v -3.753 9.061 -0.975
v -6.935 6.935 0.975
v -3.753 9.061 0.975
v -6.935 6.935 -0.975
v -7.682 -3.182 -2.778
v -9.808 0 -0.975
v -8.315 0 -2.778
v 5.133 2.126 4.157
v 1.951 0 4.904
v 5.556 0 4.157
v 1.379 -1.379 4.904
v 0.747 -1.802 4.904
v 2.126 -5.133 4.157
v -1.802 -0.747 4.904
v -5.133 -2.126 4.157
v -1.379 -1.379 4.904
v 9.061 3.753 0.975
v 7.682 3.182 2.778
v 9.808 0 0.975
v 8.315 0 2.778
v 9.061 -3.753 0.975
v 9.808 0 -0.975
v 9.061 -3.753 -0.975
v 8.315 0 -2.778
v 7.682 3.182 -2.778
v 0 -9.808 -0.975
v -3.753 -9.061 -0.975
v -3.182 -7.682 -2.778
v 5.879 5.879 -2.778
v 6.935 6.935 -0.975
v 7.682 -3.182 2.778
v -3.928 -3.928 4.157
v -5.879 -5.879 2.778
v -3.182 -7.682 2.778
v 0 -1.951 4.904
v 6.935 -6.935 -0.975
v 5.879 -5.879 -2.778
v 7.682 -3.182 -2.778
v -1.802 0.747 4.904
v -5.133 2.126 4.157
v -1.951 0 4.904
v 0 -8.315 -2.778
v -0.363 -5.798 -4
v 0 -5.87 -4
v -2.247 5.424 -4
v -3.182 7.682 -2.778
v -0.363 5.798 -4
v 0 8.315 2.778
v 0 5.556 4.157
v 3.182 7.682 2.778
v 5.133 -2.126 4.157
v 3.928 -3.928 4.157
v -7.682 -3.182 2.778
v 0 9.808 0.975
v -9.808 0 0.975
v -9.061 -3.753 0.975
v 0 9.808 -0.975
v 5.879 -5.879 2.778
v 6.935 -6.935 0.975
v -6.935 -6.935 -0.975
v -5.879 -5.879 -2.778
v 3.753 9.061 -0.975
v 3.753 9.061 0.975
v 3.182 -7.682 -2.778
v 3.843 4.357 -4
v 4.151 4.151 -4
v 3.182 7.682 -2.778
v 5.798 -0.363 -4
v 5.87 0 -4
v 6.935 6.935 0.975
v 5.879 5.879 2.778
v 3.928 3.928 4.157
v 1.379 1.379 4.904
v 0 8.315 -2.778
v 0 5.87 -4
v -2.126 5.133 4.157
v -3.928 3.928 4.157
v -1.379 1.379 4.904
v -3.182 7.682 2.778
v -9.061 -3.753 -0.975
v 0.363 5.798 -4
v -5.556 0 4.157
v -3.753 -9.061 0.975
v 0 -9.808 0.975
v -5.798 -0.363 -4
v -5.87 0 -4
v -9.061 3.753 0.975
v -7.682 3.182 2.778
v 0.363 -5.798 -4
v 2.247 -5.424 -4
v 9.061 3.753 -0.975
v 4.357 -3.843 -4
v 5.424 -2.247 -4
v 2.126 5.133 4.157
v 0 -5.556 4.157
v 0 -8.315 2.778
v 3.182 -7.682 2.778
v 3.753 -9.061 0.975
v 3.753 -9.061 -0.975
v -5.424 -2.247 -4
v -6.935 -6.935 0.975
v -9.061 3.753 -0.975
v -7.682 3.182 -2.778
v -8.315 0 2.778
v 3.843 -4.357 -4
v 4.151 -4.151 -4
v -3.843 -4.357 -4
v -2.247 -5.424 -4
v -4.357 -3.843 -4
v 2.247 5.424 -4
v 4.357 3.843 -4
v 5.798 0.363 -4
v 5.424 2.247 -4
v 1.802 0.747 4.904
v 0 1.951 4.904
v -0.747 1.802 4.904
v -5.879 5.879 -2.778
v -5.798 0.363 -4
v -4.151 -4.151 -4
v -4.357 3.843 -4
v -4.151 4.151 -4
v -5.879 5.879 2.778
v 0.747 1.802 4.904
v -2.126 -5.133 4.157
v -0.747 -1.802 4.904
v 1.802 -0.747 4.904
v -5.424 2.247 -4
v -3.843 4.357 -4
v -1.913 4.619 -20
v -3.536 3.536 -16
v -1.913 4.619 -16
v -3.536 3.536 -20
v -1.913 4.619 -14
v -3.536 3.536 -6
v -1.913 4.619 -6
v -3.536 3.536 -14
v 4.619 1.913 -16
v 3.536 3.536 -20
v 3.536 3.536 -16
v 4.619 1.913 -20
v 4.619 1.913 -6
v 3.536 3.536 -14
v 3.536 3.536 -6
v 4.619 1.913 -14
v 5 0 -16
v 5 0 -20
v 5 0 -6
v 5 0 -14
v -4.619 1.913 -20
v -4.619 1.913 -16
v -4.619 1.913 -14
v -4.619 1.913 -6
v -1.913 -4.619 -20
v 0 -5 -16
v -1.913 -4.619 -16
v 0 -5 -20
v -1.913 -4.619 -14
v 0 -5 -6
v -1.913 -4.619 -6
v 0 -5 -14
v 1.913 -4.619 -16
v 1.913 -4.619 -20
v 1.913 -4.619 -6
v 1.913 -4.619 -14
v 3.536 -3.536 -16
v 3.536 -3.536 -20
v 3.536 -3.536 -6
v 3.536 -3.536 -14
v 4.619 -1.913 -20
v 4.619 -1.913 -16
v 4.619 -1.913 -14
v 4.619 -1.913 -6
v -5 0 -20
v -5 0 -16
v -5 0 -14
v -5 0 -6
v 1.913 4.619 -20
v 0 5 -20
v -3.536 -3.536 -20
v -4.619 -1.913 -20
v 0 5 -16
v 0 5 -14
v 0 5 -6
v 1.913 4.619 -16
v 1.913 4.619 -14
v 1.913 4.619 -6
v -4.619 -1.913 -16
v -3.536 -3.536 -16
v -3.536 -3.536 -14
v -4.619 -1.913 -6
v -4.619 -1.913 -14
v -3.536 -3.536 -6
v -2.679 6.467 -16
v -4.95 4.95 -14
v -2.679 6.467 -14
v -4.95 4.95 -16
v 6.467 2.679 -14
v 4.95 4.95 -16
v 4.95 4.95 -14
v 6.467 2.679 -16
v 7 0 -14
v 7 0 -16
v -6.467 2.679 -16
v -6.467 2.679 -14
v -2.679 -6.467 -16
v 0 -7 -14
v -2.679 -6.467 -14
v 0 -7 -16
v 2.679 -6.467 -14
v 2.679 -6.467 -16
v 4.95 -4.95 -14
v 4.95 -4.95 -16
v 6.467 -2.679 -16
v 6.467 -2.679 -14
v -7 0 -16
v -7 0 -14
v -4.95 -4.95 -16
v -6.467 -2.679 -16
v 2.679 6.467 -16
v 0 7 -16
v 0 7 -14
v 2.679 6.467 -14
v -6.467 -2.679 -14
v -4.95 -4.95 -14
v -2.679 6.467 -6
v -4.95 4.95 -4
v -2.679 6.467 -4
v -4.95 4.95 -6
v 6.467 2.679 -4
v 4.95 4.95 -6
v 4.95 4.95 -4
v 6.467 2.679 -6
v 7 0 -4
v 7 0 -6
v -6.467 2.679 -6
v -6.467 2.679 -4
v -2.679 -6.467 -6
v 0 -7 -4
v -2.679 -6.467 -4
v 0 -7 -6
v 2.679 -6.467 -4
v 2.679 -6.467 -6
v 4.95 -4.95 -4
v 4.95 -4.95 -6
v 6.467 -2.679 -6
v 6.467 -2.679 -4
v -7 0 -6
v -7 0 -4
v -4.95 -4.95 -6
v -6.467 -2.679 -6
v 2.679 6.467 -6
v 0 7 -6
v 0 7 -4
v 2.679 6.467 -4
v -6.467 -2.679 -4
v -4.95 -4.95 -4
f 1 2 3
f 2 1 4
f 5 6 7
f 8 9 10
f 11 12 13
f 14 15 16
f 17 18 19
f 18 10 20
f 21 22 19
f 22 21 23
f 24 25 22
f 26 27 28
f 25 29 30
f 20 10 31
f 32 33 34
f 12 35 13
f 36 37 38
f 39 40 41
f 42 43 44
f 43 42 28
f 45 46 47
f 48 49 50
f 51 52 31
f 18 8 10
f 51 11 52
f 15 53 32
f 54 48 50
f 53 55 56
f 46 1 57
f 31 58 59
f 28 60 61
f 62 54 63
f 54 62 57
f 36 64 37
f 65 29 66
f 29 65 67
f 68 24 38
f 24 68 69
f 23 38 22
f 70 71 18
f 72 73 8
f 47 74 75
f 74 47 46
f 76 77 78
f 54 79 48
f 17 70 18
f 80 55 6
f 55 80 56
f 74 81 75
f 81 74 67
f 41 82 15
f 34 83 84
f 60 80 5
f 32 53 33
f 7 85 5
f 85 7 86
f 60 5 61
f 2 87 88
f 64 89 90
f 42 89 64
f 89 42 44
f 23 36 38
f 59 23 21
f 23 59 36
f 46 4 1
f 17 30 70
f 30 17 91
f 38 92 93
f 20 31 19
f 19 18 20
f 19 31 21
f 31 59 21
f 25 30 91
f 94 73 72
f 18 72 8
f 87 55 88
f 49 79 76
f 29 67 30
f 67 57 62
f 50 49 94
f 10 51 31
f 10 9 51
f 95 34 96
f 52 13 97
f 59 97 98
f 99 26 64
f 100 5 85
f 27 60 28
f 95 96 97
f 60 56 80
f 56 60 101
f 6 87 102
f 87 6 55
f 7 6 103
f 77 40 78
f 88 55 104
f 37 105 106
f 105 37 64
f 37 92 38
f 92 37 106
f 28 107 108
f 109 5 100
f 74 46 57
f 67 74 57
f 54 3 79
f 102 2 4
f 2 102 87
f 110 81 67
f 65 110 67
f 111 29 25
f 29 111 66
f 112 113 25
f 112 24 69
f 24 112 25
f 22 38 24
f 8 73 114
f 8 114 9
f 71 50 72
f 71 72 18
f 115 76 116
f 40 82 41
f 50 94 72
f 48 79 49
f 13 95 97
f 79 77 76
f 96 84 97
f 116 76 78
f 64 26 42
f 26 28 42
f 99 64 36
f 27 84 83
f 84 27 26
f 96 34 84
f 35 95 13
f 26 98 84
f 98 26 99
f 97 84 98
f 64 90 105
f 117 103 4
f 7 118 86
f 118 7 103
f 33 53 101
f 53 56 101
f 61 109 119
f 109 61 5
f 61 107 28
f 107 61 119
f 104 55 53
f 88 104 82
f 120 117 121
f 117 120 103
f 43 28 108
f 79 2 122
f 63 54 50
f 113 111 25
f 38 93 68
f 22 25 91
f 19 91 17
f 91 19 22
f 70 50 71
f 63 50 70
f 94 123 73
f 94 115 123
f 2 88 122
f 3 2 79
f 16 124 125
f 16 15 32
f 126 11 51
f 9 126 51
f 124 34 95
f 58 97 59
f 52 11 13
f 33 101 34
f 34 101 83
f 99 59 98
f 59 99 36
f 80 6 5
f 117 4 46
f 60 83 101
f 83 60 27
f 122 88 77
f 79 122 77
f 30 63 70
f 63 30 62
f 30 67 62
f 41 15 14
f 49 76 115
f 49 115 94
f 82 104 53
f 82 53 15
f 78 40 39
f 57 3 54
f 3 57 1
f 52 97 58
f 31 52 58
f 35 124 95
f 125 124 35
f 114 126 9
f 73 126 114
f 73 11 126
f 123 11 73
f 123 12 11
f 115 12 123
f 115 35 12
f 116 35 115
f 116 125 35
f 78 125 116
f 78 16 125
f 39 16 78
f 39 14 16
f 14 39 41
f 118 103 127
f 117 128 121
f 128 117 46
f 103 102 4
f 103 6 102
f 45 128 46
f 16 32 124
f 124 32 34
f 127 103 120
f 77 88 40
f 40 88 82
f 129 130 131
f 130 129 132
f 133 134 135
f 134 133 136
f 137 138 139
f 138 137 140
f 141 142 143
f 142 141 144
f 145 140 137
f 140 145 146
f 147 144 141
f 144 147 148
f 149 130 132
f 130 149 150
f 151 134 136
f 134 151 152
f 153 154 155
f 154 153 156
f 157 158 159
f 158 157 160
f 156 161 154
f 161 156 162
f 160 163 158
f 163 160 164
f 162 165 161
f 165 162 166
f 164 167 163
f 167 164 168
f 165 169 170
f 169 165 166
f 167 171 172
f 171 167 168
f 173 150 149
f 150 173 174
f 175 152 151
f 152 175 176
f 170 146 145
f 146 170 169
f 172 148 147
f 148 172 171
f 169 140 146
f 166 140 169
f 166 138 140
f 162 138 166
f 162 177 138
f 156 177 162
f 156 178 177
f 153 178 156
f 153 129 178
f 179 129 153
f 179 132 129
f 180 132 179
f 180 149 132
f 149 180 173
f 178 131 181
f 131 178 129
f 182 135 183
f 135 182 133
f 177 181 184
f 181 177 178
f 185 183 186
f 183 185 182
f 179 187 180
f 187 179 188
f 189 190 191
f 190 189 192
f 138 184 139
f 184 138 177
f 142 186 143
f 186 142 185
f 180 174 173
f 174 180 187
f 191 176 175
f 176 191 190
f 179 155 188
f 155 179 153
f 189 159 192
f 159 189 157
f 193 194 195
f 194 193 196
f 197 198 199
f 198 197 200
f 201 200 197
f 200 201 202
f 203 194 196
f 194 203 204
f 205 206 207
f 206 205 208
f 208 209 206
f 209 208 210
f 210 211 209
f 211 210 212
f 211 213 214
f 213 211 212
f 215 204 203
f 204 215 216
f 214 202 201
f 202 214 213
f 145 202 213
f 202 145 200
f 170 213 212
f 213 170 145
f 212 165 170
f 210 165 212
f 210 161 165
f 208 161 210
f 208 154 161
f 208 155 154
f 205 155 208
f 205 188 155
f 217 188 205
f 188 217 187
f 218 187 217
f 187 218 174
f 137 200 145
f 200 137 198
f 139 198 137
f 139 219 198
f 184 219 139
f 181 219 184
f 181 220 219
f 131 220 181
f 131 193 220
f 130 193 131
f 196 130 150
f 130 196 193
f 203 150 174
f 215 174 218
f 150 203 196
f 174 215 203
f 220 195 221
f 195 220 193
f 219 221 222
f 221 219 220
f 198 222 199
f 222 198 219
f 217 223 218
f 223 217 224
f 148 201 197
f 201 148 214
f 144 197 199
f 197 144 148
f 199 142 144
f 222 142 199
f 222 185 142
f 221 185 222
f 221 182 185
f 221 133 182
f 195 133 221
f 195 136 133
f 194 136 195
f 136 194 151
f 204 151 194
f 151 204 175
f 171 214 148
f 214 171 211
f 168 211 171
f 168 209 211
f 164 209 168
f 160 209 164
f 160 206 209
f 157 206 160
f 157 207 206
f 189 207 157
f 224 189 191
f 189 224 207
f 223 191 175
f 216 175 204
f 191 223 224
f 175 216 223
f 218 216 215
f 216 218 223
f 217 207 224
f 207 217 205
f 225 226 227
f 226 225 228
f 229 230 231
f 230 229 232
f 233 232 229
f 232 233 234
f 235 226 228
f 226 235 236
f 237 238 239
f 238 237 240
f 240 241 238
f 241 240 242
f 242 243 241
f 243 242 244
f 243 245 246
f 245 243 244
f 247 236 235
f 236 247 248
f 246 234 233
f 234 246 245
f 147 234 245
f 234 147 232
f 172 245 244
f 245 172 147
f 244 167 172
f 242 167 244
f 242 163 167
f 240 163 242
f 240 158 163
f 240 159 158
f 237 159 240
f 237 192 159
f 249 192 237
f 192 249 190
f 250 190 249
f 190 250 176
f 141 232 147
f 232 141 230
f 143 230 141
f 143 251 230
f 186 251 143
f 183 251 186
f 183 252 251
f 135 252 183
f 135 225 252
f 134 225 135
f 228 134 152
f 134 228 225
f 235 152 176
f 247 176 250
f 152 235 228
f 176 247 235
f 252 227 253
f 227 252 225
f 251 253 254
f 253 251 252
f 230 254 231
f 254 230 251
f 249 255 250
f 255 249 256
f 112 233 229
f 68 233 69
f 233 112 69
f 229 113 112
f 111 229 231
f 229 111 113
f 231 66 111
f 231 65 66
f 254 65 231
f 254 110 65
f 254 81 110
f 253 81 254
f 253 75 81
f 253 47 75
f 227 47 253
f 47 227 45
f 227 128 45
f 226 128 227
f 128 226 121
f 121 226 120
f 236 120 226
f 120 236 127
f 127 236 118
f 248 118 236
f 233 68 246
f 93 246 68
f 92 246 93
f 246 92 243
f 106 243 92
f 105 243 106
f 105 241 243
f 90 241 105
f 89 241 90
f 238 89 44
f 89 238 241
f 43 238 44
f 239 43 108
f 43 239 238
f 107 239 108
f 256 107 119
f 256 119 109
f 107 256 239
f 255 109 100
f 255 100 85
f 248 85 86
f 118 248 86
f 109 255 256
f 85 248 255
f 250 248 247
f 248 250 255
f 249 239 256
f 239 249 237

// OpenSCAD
module mushroom_fastener() {
    $fn = 16; // Low-poly tessellation
    union() {
        // Domed/conical head
        translate([0, 0, 10])
        scale([1, 1, 0.5])
        sphere(r=10);

        // Central cylindrical shank
        cylinder(h=20, r=5, center=true);

        // First retaining flange/rib
        translate([0, 0, -5])
        cylinder(h=2, r=7, center=true);

        // Second retaining flange/rib
        translate([0, 0, 5])
        cylinder(h=2, r=7, center=true);
    }
}

translate([0, 0, -10])
mushroom_fastener();
